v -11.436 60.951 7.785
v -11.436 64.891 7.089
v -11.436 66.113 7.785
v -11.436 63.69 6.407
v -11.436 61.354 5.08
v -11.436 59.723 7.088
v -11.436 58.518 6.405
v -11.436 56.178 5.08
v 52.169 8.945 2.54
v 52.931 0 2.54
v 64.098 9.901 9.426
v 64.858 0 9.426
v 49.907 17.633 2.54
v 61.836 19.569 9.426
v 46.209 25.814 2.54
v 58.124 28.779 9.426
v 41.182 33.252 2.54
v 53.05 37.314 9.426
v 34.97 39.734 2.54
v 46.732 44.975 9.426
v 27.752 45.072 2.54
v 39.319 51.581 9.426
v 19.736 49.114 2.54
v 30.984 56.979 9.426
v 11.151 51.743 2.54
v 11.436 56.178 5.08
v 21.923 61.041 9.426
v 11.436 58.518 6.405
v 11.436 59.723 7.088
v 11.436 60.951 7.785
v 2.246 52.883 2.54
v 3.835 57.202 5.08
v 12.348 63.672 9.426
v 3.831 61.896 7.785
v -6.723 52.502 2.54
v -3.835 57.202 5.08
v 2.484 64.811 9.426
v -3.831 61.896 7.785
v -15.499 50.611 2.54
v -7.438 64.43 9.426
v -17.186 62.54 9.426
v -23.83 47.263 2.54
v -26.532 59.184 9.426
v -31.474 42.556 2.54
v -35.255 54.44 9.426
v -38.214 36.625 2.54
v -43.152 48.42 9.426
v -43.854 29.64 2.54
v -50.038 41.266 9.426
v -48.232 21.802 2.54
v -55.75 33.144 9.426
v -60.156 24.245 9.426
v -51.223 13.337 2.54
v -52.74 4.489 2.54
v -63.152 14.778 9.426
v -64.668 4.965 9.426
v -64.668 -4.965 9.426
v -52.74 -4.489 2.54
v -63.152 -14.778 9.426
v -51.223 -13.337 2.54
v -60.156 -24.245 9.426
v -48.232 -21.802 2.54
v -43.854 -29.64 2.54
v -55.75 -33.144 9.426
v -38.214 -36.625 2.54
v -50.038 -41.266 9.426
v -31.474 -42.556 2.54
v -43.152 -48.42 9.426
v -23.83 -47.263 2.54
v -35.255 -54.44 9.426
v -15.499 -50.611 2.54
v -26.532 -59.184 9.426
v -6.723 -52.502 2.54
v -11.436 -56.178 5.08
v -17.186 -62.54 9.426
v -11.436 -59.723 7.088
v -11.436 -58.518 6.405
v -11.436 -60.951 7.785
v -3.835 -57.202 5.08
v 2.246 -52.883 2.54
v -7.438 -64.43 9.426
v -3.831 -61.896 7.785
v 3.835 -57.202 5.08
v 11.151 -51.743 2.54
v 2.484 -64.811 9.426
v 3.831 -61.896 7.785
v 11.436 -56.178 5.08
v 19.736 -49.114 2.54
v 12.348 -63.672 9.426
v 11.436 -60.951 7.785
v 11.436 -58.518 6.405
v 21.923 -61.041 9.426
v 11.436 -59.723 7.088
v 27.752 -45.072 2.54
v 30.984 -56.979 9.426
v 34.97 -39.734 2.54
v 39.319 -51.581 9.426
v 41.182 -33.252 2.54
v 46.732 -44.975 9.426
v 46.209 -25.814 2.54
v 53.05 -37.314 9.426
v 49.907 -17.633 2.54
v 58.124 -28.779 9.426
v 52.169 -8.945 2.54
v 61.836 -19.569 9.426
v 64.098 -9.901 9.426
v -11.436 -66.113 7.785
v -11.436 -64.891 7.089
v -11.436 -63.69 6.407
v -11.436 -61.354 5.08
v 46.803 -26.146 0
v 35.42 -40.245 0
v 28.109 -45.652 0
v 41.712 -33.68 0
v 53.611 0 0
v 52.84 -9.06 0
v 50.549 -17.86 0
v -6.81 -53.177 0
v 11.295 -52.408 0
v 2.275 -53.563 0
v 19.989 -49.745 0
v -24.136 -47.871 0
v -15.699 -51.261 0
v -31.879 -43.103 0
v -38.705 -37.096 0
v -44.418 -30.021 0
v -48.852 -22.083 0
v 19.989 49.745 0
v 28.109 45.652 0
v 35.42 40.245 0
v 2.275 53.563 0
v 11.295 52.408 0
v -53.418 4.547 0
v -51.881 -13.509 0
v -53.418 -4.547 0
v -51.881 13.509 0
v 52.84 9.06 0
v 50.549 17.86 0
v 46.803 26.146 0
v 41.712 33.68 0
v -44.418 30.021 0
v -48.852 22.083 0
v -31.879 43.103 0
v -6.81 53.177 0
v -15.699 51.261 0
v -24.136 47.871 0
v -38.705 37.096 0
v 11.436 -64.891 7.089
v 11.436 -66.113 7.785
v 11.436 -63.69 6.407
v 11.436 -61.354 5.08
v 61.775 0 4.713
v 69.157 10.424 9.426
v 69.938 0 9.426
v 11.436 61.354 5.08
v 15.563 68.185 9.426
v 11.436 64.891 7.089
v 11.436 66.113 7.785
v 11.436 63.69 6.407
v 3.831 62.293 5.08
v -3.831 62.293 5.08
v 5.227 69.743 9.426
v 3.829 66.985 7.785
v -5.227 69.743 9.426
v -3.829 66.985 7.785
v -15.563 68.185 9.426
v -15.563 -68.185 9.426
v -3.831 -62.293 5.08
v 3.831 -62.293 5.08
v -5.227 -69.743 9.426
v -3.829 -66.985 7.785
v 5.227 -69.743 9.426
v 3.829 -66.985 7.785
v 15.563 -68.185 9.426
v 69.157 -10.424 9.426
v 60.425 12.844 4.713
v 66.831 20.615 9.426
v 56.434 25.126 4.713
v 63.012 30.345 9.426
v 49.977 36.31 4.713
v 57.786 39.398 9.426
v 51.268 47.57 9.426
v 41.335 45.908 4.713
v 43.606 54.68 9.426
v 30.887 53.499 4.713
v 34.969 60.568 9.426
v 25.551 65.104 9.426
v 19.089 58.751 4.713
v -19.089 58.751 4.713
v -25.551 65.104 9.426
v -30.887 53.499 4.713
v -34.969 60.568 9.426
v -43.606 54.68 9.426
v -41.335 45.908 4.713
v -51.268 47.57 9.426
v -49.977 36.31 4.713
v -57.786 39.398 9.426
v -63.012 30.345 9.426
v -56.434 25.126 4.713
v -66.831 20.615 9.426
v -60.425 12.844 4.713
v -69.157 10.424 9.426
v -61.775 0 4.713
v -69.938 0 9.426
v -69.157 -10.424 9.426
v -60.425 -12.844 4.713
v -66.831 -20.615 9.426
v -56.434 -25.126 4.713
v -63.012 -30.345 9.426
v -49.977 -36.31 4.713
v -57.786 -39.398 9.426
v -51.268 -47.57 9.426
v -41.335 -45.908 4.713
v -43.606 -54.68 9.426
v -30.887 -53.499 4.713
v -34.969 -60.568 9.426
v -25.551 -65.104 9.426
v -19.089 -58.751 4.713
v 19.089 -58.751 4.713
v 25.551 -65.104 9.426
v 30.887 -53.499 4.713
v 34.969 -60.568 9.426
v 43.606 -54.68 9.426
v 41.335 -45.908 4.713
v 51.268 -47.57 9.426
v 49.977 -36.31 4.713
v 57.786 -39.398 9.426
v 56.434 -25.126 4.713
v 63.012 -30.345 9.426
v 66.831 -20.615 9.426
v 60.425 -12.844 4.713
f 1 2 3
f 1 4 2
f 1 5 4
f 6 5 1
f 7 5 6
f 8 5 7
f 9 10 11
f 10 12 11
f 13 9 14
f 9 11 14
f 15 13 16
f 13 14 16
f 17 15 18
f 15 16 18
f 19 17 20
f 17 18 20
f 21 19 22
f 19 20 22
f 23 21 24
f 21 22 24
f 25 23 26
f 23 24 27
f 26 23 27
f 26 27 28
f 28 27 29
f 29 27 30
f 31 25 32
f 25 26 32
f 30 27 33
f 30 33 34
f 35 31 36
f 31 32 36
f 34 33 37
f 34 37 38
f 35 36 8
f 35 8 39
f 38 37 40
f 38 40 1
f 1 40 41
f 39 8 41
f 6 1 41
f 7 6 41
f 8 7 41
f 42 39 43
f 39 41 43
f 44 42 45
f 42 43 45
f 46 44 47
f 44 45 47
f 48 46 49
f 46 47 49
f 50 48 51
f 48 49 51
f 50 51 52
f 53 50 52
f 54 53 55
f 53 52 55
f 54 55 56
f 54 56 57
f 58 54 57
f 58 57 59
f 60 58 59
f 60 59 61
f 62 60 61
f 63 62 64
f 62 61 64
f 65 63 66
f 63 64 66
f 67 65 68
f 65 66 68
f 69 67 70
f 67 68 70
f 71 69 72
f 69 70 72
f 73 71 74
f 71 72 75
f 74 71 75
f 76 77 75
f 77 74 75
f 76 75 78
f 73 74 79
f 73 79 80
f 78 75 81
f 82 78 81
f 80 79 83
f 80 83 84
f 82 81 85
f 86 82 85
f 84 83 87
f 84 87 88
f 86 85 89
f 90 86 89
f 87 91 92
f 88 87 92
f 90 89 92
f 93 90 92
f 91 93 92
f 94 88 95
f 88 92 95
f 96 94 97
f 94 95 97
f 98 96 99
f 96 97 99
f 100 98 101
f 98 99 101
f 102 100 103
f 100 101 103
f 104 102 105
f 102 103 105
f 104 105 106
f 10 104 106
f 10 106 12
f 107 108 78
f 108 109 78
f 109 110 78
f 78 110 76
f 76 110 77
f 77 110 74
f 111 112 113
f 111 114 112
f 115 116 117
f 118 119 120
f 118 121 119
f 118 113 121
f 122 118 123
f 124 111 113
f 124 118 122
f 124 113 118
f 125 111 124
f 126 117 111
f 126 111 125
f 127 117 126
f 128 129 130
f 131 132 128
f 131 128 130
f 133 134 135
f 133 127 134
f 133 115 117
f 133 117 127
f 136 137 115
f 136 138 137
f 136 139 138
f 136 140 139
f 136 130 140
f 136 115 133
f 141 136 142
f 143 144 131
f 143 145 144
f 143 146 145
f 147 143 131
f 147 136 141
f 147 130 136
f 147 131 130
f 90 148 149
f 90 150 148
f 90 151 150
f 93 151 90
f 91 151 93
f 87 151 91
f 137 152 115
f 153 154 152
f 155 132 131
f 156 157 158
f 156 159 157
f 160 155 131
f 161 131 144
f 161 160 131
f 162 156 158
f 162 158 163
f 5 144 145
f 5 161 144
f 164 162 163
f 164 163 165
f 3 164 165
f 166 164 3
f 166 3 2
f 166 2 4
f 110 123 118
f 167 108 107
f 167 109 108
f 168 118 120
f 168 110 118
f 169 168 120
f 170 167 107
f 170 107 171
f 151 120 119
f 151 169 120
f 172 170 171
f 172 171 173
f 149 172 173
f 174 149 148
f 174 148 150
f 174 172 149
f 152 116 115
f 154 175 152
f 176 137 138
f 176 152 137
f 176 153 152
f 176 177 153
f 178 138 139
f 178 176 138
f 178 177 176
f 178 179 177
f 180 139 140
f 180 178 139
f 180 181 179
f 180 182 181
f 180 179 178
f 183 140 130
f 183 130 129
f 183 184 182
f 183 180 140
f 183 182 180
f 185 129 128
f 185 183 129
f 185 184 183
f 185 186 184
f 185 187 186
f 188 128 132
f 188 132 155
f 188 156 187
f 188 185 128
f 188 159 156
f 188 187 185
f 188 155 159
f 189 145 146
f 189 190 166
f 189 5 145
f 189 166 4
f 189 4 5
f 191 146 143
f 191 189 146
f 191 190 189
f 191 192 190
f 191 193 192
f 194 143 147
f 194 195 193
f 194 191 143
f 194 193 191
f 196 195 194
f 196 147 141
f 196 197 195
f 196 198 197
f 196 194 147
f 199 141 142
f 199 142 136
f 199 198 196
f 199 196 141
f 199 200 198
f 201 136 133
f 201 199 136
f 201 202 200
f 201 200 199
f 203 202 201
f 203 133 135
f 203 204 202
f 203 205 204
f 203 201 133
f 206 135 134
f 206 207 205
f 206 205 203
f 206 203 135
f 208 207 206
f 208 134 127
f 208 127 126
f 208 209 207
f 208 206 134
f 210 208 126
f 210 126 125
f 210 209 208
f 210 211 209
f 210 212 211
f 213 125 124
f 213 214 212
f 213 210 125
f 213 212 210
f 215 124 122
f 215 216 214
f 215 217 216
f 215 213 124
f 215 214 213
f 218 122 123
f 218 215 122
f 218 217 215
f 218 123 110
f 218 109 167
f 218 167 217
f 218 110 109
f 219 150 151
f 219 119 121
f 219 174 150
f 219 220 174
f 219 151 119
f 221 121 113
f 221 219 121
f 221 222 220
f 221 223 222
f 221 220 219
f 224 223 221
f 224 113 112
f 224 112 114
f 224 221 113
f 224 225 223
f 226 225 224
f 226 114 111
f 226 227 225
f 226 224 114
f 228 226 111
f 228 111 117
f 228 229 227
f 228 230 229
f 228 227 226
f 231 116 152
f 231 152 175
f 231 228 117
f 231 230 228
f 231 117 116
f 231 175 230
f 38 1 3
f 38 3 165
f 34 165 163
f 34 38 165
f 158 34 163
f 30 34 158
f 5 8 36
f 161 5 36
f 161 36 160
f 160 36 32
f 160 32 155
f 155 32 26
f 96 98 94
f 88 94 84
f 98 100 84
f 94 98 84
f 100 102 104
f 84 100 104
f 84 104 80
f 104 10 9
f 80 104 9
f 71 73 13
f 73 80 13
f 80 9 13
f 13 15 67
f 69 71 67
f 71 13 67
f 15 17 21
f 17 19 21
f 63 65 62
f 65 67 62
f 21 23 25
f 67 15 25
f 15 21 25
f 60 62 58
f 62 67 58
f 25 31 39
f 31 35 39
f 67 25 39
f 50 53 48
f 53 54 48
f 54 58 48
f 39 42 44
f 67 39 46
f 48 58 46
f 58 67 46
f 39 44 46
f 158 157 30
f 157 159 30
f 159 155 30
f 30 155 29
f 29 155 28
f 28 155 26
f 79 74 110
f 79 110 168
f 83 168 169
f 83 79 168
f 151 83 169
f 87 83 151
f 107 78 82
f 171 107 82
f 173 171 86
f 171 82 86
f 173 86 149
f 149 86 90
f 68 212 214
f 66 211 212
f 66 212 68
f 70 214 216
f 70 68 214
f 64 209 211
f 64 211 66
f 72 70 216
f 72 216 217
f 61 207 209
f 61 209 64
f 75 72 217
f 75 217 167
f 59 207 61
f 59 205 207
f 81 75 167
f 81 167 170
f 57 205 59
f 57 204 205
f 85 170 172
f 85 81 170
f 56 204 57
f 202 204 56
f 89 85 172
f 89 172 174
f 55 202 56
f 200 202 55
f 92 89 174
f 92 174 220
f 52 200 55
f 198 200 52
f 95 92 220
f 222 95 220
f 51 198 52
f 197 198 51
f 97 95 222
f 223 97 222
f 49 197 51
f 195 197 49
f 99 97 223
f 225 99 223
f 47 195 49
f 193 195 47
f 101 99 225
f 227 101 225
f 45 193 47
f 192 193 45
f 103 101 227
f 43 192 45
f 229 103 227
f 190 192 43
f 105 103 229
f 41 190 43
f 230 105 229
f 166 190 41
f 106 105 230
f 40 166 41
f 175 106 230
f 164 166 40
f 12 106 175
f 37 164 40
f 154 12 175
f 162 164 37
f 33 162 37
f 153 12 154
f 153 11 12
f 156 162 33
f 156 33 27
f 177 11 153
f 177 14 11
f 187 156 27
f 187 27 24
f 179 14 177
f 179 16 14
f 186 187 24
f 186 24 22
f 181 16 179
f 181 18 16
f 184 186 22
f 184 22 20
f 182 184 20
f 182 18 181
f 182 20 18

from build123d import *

# Parameters (mm, degrees)
F2_T     = -2.54
F3_W     = 22.871588
F3_H     = 2.704573
F4_DEPTH = 69.939388
F5_DEPTH = 69.939388


with BuildPart() as f1:
    # F0 (on Front) → F1 (revolve)
    with BuildSketch(Plane.XZ):
        Polygon((0, 9.426419), (0, 0), (53.611351, 0), (69.938388, 9.426419), align=None)
    revolve(axis=Axis((0, 0, 4.71321), (0, 0, 1)))

    # F2
    f2_openings = [f1.faces().sort_by_distance(p)[0] for p in [
        (0, 0, 9.426419),
    ]]
    offset(amount=F2_T, openings=f2_openings)

    # F3 (on Front) → F4 (cut, through all)
    with BuildSketch(Plane.XZ):
        with Locations((0, 6.432339)):
            Rectangle(F3_W, F3_H)
    extrude(amount=-F4_DEPTH, mode=Mode.SUBTRACT)

    # F3 (on Front) → F5 (cut, through all)
    with BuildSketch(Plane.XZ):
        with Locations((0, 6.432339)):
            Rectangle(F3_W, F3_H)
    extrude(amount=F5_DEPTH, mode=Mode.SUBTRACT)


solid = f1.part
